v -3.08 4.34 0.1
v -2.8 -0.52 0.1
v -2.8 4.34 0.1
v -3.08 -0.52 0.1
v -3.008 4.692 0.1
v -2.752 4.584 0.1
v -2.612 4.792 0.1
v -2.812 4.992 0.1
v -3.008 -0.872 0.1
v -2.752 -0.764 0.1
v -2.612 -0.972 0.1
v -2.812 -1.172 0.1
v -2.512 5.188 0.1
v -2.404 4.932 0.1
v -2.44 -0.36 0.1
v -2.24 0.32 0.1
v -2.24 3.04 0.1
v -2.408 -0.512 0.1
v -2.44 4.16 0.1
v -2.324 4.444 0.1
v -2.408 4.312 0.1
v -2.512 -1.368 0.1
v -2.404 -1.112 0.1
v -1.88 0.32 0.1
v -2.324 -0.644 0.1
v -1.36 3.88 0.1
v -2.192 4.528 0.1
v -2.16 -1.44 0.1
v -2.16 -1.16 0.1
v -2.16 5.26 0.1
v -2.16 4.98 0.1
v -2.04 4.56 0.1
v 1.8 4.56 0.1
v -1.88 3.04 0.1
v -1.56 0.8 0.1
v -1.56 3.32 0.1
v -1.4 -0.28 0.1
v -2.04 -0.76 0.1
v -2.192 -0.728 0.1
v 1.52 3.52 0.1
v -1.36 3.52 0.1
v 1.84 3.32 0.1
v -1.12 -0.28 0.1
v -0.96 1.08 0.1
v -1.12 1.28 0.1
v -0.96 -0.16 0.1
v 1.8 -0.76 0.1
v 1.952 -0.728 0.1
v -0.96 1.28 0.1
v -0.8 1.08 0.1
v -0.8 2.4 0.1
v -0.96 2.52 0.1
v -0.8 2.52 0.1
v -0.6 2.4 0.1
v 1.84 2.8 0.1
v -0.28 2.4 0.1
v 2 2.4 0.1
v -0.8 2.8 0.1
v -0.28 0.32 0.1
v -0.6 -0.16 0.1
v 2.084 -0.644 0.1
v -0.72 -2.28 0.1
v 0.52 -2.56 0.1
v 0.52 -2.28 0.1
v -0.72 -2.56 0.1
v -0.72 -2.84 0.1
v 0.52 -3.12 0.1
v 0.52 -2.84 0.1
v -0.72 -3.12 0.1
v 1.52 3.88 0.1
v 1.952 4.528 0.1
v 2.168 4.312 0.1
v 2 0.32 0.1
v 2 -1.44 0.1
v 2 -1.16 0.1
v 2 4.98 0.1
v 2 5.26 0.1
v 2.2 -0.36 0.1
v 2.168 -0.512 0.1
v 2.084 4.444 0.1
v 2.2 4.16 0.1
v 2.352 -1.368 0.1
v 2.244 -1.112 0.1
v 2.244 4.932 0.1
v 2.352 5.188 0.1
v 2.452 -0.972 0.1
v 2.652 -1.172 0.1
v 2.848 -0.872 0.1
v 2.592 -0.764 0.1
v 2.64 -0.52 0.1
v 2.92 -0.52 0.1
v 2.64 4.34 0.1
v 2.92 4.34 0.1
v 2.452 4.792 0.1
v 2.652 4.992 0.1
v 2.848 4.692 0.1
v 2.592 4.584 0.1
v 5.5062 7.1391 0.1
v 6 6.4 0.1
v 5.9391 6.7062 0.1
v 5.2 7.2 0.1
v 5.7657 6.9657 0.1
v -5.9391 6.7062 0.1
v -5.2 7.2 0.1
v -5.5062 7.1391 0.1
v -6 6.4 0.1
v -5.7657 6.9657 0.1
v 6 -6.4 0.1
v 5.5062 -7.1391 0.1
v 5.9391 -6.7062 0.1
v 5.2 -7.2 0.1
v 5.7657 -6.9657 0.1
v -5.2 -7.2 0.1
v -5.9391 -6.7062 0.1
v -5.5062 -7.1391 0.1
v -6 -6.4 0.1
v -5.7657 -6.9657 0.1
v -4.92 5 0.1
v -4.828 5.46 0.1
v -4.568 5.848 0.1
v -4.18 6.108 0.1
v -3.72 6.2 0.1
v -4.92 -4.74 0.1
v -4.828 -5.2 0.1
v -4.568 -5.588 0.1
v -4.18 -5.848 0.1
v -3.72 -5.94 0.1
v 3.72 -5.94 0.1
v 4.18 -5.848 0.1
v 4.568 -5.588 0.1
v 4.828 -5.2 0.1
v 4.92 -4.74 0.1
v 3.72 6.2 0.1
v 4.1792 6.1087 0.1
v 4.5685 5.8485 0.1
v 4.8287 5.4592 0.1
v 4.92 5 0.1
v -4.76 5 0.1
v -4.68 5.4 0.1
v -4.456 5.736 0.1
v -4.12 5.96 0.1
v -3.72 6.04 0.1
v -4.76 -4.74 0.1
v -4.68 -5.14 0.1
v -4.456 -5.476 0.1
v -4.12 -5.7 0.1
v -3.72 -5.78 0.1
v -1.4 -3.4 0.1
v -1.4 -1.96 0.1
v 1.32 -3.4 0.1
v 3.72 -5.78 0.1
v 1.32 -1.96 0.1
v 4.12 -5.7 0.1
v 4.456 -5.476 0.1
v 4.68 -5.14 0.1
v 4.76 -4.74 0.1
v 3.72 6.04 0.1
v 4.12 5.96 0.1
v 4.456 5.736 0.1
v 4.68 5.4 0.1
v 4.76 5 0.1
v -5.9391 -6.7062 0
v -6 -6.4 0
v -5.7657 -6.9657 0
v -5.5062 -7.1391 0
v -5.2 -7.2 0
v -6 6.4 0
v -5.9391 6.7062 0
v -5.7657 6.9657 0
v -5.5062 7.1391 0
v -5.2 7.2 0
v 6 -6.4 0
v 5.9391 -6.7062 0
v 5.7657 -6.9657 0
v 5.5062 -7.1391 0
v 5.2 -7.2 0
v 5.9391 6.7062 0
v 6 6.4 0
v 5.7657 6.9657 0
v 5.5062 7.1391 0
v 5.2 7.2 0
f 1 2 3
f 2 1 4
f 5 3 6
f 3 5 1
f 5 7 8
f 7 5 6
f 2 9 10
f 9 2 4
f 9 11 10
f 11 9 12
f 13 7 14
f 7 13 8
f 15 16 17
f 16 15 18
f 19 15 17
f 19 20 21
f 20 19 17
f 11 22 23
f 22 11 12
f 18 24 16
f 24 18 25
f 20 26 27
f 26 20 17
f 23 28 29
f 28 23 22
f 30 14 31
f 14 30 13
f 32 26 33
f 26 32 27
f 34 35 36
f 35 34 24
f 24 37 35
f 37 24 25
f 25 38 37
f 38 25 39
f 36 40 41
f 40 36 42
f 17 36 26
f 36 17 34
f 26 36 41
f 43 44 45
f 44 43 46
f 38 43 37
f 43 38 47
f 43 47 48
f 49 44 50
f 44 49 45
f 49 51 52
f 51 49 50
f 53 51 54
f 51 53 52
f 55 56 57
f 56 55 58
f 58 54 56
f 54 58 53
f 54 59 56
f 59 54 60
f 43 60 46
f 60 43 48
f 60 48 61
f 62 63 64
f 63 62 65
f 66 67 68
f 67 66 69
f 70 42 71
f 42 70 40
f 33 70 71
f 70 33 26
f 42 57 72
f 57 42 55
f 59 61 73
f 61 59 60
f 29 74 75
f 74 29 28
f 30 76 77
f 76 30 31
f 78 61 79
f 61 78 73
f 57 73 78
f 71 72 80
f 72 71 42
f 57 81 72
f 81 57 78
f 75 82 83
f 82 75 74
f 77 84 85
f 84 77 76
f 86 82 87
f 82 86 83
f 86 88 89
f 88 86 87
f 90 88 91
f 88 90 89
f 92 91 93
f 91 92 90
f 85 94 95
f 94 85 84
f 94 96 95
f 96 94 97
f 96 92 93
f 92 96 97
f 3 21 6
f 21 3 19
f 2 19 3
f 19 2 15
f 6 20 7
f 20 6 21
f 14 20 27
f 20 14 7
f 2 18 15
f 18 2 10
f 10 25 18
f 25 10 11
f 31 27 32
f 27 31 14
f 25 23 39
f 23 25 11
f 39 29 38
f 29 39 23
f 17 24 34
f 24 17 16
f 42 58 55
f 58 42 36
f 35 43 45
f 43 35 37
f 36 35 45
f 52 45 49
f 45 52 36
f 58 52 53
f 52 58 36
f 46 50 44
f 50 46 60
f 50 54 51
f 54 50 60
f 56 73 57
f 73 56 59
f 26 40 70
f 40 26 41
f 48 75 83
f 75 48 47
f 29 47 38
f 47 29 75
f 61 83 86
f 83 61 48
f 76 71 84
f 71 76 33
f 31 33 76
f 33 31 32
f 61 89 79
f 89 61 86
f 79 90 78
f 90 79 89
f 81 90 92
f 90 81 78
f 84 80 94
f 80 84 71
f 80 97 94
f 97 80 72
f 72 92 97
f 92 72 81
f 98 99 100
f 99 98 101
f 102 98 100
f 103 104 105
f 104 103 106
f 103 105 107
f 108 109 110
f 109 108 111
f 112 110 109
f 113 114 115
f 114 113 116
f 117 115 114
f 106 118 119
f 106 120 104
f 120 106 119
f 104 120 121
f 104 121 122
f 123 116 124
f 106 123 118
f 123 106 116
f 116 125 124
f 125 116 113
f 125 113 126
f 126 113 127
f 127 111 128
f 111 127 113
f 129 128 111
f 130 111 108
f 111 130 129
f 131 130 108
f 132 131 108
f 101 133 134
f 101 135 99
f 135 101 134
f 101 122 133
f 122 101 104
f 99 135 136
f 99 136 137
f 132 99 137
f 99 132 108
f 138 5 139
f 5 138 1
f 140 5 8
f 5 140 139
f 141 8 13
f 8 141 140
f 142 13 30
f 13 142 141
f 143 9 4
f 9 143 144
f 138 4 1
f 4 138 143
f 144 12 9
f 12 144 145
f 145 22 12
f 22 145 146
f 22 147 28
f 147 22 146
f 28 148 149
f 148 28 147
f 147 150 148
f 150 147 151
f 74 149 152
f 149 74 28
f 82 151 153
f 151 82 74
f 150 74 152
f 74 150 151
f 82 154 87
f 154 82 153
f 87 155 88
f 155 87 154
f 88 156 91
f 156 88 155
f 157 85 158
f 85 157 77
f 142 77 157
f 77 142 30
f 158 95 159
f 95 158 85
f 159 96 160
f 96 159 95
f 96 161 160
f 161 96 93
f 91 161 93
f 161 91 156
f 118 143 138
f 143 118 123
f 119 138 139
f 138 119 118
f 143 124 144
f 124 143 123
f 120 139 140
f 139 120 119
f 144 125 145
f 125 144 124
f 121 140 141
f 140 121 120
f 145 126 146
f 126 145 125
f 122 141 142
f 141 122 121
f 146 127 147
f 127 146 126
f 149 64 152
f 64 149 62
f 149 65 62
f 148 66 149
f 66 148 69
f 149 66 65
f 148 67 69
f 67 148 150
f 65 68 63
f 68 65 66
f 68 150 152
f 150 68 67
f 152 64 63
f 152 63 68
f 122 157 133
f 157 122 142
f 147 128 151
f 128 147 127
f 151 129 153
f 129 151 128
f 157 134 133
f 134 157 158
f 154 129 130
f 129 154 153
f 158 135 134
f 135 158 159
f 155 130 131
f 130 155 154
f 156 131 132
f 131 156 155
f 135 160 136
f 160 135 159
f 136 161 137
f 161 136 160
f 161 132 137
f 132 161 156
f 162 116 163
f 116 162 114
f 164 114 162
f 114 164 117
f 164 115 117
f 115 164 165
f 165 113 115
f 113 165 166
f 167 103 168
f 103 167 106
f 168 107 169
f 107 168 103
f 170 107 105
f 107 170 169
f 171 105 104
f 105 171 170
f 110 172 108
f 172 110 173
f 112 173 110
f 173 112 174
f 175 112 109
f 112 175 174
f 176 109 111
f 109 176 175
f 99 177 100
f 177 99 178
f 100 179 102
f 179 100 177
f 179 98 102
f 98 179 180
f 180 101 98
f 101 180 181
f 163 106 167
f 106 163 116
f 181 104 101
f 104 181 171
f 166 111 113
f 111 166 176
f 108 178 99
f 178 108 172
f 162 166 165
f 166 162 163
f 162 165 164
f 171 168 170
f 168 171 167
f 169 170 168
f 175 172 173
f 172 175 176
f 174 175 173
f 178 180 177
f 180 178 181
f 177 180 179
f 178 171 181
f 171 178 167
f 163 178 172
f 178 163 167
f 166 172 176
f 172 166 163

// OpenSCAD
// file: ../p/1-4cyli.scad
use <../lib.scad>
function ldraw_lib__1_4cyli() = [
// 0 Cylinder 0.25
// 0 Name: 1-4cyli.dat
// 0 Author: James Jessiman
// 0 !LDRAW_ORG Primitive UPDATE 2012-01
// 0 !LICENSE Licensed under CC BY 2.0 and CC BY 4.0 : see CAreadme.txt
// 
// 0 BFC CERTIFY CCW
  [0,"BFC","CERTIFY"],
  [0,"BFC","CCW"],
// 
// 0 !HISTORY 2002-03-23 [sbliss] Added BFC statement.
// 0 !HISTORY 2002-04-25 [PTadmin] Official Update 2002-02
// 0 !HISTORY 2007-06-22 [PTadmin] Header formatted for Contributor Agreement
// 0 !HISTORY 2008-07-01 [PTadmin] Official Update 2008-01
// 0 !HISTORY 2012-02-16 [Philo] Changed to CCW
// 0 !HISTORY 2012-03-30 [PTadmin] Official Update 2012-01
// 
// 
// 4 16 1 1 0 0.9239 1 0.3827 0.9239 0 0.3827 1 0 0
  [4,16,1,1,0,0.9239,1,0.3827,0.9239,0,0.3827,1,0,0],
// 5 24 1 0 0 1 1 0 0.9239 0 0.3827 1 0 -1
  [5,24,1,0,0,1,1,0,0.9239,0,0.3827,1,0,-1],
// 4 16 0.9239 1 0.3827 0.7071 1 0.7071 0.7071 0 0.7071 0.9239 0 0.3827
  [4,16,0.9239,1,0.3827,0.7071,1,0.7071,0.7071,0,0.7071,0.9239,0,0.3827],
// 5 24 0.9239 0 0.3827 0.9239 1 0.3827 0.7071 0 0.7071 1 0 0
  [5,24,0.9239,0,0.3827,0.9239,1,0.3827,0.7071,0,0.7071,1,0,0],
// 4 16 0.7071 1 0.7071 0.3827 1 0.9239 0.3827 0 0.9239 0.7071 0 0.7071
  [4,16,0.7071,1,0.7071,0.3827,1,0.9239,0.3827,0,0.9239,0.7071,0,0.7071],
// 5 24 0.7071 0 0.7071 0.7071 1 0.7071 0.3827 0 0.9239 0.9239 0 0.3827
  [5,24,0.7071,0,0.7071,0.7071,1,0.7071,0.3827,0,0.9239,0.9239,0,0.3827],
// 4 16 0.3827 1 0.9239 0 1 1 0 0 1 0.3827 0 0.9239
  [4,16,0.3827,1,0.9239,0,1,1,0,0,1,0.3827,0,0.9239],
// 5 24 0.3827 0 0.9239 0.3827 1 0.9239 0 0 1 0.7071 0 0.7071
  [5,24,0.3827,0,0.9239,0.3827,1,0.9239,0,0,1,0.7071,0,0.7071],
// 5 24 0 0 1 0 1 1 0.3827 0 0.9239 -1 0 1
  [5,24,0,0,1,0,1,1,0.3827,0,0.9239,-1,0,1],
];
makepoly(ldraw_lib__1_4cyli(), line=0.2);
// file: ../p/1-4chrd.scad
use <../lib.scad>
function ldraw_lib__1_4chrd() = [
// 0 Chord 0.25
// 0 Name: 1-4chrd.dat
// 0 Author: Tony Hafner [hafhead]
// 0 !LDRAW_ORG Primitive UPDATE 2012-02
// 0 !LICENSE Licensed under CC BY 2.0 and CC BY 4.0 : see CAreadme.txt
// 
// 0 BFC CERTIFY CCW
  [0,"BFC","CERTIFY"],
  [0,"BFC","CCW"],
// 
// 0 !HISTORY 2004-04-22 [PTadmin] Official Update 2004-02
// 0 !HISTORY 2007-10-09 [PTadmin] Header formatted for Contributor Agreement
// 0 !HISTORY 2008-07-01 [PTadmin] Official Update 2008-01
// 0 !HISTORY 2012-08-02 [MMR1988] Re-creation with PrimGen2 and Rectifier
// 0 !HISTORY 2012-08-09 [PTadmin] Official Update 2012-02
// 
// 
// 4 16 0.9239 0 0.3827 0.3827 0 0.9239 0 0 1 1 0 0
  [4,16,0.9239,0,0.3827,0.3827,0,0.9239,0,0,1,1,0,0],
// 3 16 0.7071 0 0.7071 0.3827 0 0.9239 0.9239 0 0.3827
  [3,16,0.7071,0,0.7071,0.3827,0,0.9239,0.9239,0,0.3827],
];
makepoly(ldraw_lib__1_4chrd(), line=0.2);
// main file
use <../lib.scad>
use <../p/1-4chrd.scad>
use <../p/1-4cyli.scad>
function ldraw_lib__6138629f() = [
// 0 Sticker  1.5 x  1.8 Red with Containment Unit
// 0 Name: 6138629f.dat
// 0 Author: Joel Barker [joel333]
// 0 !LDRAW_ORG Part UPDATE 2022-01
// 0 !LICENSE Licensed under CC BY 2.0 and CC BY 4.0 : see CAreadme.txt
// 
// 0 BFC CERTIFY CCW
  [0,"BFC","CERTIFY"],
  [0,"BFC","CCW"],
// 
// 0 !KEYWORDS firehouse, Ghostbusters, set 75827
// 
// 0 !HISTORY 2022-01-14 [PTadmin] Official Update 2022-01
// 
// 
// 0 // black background
// 4 0 -7.7 -0.25 10.85 -7.7 -0.25 -1.3 -7 -0.25 -1.3 -7 -0.25 10.85
  [4,0,-7.7,-0.25,10.85,-7.7,-0.25,-1.3,-7,-0.25,-1.3,-7,-0.25,10.85],
// 4 0 -7.52 -0.25 11.73 -7.7 -0.25 10.85 -7 -0.25 10.85 -6.88 -0.25 11.46
  [4,0,-7.52,-0.25,11.73,-7.7,-0.25,10.85,-7,-0.25,10.85,-6.88,-0.25,11.46],
// 4 0 -7.03 -0.25 12.48 -7.52 -0.25 11.73 -6.88 -0.25 11.46 -6.53 -0.25 11.98
  [4,0,-7.03,-0.25,12.48,-7.52,-0.25,11.73,-6.88,-0.25,11.46,-6.53,-0.25,11.98],
// 4 0 -6.88 -0.25 -1.91 -7 -0.25 -1.3 -7.7 -0.25 -1.3 -7.52 -0.25 -2.18
  [4,0,-6.88,-0.25,-1.91,-7,-0.25,-1.3,-7.7,-0.25,-1.3,-7.52,-0.25,-2.18],
// 4 0 -6.53 -0.25 -2.43 -6.88 -0.25 -1.91 -7.52 -0.25 -2.18 -7.03 -0.25 -2.93
  [4,0,-6.53,-0.25,-2.43,-6.88,-0.25,-1.91,-7.52,-0.25,-2.18,-7.03,-0.25,-2.93],
// 4 0 -6.28 -0.25 12.97 -7.03 -0.25 12.48 -6.53 -0.25 11.98 -6.01 -0.25 12.33
  [4,0,-6.28,-0.25,12.97,-7.03,-0.25,12.48,-6.53,-0.25,11.98,-6.01,-0.25,12.33],
// 4 0 -6.1 -0.25 -0.9 -6.02 -0.25 -1.28 -5.6 -0.25 0.8 -5.6 -0.25 7.6
  [4,0,-6.1,-0.25,-0.9,-6.02,-0.25,-1.28,-5.6,-0.25,0.8,-5.6,-0.25,7.6],
// 3 0 -6.1 -0.25 10.4 -6.1 -0.25 -0.9 -5.6 -0.25 7.6
  [3,0,-6.1,-0.25,10.4,-6.1,-0.25,-0.9,-5.6,-0.25,7.6],
// 4 0 -6.02 -0.25 10.78 -6.1 -0.25 10.4 -5.6 -0.25 7.6 -5.81 -0.25 11.11
  [4,0,-6.02,-0.25,10.78,-6.1,-0.25,10.4,-5.6,-0.25,7.6,-5.81,-0.25,11.11],
// 4 0 -6.01 -0.25 -2.78 -6.53 -0.25 -2.43 -7.03 -0.25 -2.93 -6.28 -0.25 -3.42
  [4,0,-6.01,-0.25,-2.78,-6.53,-0.25,-2.43,-7.03,-0.25,-2.93,-6.28,-0.25,-3.42],
// 4 0 -5.81 -0.25 -1.61 -4.7 -0.25 0.8 -5.6 -0.25 0.8 -6.02 -0.25 -1.28
  [4,0,-5.81,-0.25,-1.61,-4.7,-0.25,0.8,-5.6,-0.25,0.8,-6.02,-0.25,-1.28],
// 4 0 -5.81 -0.25 11.11 -5.6 -0.25 7.6 -3.4 -0.25 9.7 -5.48 -0.25 11.32
  [4,0,-5.81,-0.25,11.11,-5.6,-0.25,7.6,-3.4,-0.25,9.7,-5.48,-0.25,11.32],
// 4 0 -5.4 -0.25 -2.9 -6.01 -0.25 -2.78 -6.28 -0.25 -3.42 -5.4 -0.25 -3.6
  [4,0,-5.4,-0.25,-2.9,-6.01,-0.25,-2.78,-6.28,-0.25,-3.42,-5.4,-0.25,-3.6],
// 4 0 -5.4 -0.25 13.15 -6.28 -0.25 12.97 -6.01 -0.25 12.33 -5.4 -0.25 12.45
  [4,0,-5.4,-0.25,13.15,-6.28,-0.25,12.97,-6.01,-0.25,12.33,-5.4,-0.25,12.45],
// 4 0 -5.1 -0.25 11.4 -5.48 -0.25 11.32 -3.4 -0.25 9.7 4.5 -0.25 11.4
  [4,0,-5.1,-0.25,11.4,-5.48,-0.25,11.32,-3.4,-0.25,9.7,4.5,-0.25,11.4],
// 4 0 -4.7 -0.25 7.6 -4.7 -0.25 0.8 -3.9 -0.25 2 -3.9 -0.25 8.3
  [4,0,-4.7,-0.25,7.6,-4.7,-0.25,0.8,-3.9,-0.25,2,-3.9,-0.25,8.3],
// 4 0 -3.5 -0.25 -0.7 -3.9 -0.25 2 -4.7 -0.25 0.8 -5.81 -0.25 -1.61
  [4,0,-3.5,-0.25,-0.7,-3.9,-0.25,2,-4.7,-0.25,0.8,-5.81,-0.25,-1.61],
// 4 0 -3.5 -0.25 -0.7 -5.81 -0.25 -1.61 -5.48 -0.25 -1.82 -5.1 -0.25 -1.9
  [4,0,-3.5,-0.25,-0.7,-5.81,-0.25,-1.61,-5.48,-0.25,-1.82,-5.1,-0.25,-1.9],
// 4 0 -3.4 -0.25 8.8 -3.9 -0.25 8.3 4.6 -0.25 8.3 3.8 -0.25 8.8
  [4,0,-3.4,-0.25,8.8,-3.9,-0.25,8.3,4.6,-0.25,8.3,3.8,-0.25,8.8],
// 4 0 -3.4 -0.25 9.7 -5.6 -0.25 7.6 -4.7 -0.25 7.6 -3.9 -0.25 8.3
  [4,0,-3.4,-0.25,9.7,-5.6,-0.25,7.6,-4.7,-0.25,7.6,-3.9,-0.25,8.3],
// 3 0 -3.4 -0.25 9.7 -3.9 -0.25 8.3 -3.4 -0.25 8.8
  [3,0,-3.4,-0.25,9.7,-3.9,-0.25,8.3,-3.4,-0.25,8.8],
// 4 0 -2.8 -0.25 3.2 -2.8 -0.25 -0.7 -2.4 -0.25 -0.4 -2.4 -0.25 2.7
  [4,0,-2.8,-0.25,3.2,-2.8,-0.25,-0.7,-2.4,-0.25,-0.4,-2.4,-0.25,2.7],
// 4 0 -2.8 -0.25 -0.7 -3.5 -0.25 -0.7 -5.1 -0.25 -1.9 4.5 -0.25 -1.9
  [4,0,-2.8,-0.25,-0.7,-3.5,-0.25,-0.7,-5.1,-0.25,-1.9,4.5,-0.25,-1.9],
// 3 0 -2.8 -0.25 -0.7 4.5 -0.25 -1.9 4.88 -0.25 -1.82
  [3,0,-2.8,-0.25,-0.7,4.5,-0.25,-1.9,4.88,-0.25,-1.82],
// 4 0 -2.4 -0.25 3.2 -2.8 -0.25 3.2 -2.4 -0.25 2.7 -2 -0.25 2.7
  [4,0,-2.4,-0.25,3.2,-2.8,-0.25,3.2,-2.4,-0.25,2.7,-2,-0.25,2.7],
// 4 0 -2.4 -0.25 6.3 -2.4 -0.25 3.2 -2 -0.25 2.7 -2 -0.25 6
  [4,0,-2.4,-0.25,6.3,-2.4,-0.25,3.2,-2,-0.25,2.7,-2,-0.25,6],
// 4 0 -2.4 -0.25 6.3 -2 -0.25 6 -1.5 -0.25 6 -2 -0.25 6.3
  [4,0,-2.4,-0.25,6.3,-2,-0.25,6,-1.5,-0.25,6,-2,-0.25,6.3],
// 4 0 -2 -0.25 7 -0.7 -0.25 6 5 -0.25 6 4.6 -0.25 7
  [4,0,-2,-0.25,7,-0.7,-0.25,6,5,-0.25,6,4.6,-0.25,7],
// 4 0 -2 -0.25 7 -2 -0.25 6.3 -1.5 -0.25 6 -0.7 -0.25 6
  [4,0,-2,-0.25,7,-2,-0.25,6.3,-1.5,-0.25,6,-0.7,-0.25,6],
// 4 0 -1.5 -0.25 6 -1.5 -0.25 -0.4 -0.7 -0.25 0.8 -0.7 -0.25 6
  [4,0,-1.5,-0.25,6,-1.5,-0.25,-0.4,-0.7,-0.25,0.8,-0.7,-0.25,6],
// 4 0 -1.5 -0.25 -0.4 -2.4 -0.25 -0.4 -2.8 -0.25 -0.7 4.88 -0.25 -1.82
  [4,0,-1.5,-0.25,-0.4,-2.4,-0.25,-0.4,-2.8,-0.25,-0.7,4.88,-0.25,-1.82],
// 3 0 -1.5 -0.25 -0.4 4.88 -0.25 -1.82 5.21 -0.25 -1.61
  [3,0,-1.5,-0.25,-0.4,4.88,-0.25,-1.82,5.21,-0.25,-1.61],
// 4 0 1.3 -0.25 -5.7 -1.8 -0.25 -5.7 -1.8 -0.25 -6.4 1.3 -0.25 -6.4
  [4,0,1.3,-0.25,-5.7,-1.8,-0.25,-5.7,-1.8,-0.25,-6.4,1.3,-0.25,-6.4],
// 4 0 1.3 -0.25 -7.1 -1.8 -0.25 -7.1 -1.8 -0.25 -7.8 1.3 -0.25 -7.8
  [4,0,1.3,-0.25,-7.1,-1.8,-0.25,-7.1,-1.8,-0.25,-7.8,1.3,-0.25,-7.8],
// 4 0 3.8 -0.25 9.7 3.8 -0.25 8.8 4.6 -0.25 8.3 4.88 -0.25 11.32
  [4,0,3.8,-0.25,9.7,3.8,-0.25,8.8,4.6,-0.25,8.3,4.88,-0.25,11.32],
// 4 0 3.8 -0.25 9.7 4.88 -0.25 11.32 4.5 -0.25 11.4 -3.4 -0.25 9.7
  [4,0,3.8,-0.25,9.7,4.88,-0.25,11.32,4.5,-0.25,11.4,-3.4,-0.25,9.7],
// 4 0 4.6 -0.25 8.3 4.6 -0.25 7 5 -0.25 6 5.42 -0.25 10.78
  [4,0,4.6,-0.25,8.3,4.6,-0.25,7,5,-0.25,6,5.42,-0.25,10.78],
// 4 0 5 -0.25 0.8 -0.7 -0.25 0.8 -1.5 -0.25 -0.4 5.21 -0.25 -1.61
  [4,0,5,-0.25,0.8,-0.7,-0.25,0.8,-1.5,-0.25,-0.4,5.21,-0.25,-1.61],
// 4 0 5 -0.25 -2.9 -5.4 -0.25 -2.9 -5.4 -0.25 -3.6 5 -0.25 -3.6
  [4,0,5,-0.25,-2.9,-5.4,-0.25,-2.9,-5.4,-0.25,-3.6,5,-0.25,-3.6],
// 4 0 5 -0.25 13.15 -5.4 -0.25 13.15 -5.4 -0.25 12.45 5 -0.25 12.45
  [4,0,5,-0.25,13.15,-5.4,-0.25,13.15,-5.4,-0.25,12.45,5,-0.25,12.45],
// 4 0 5 -0.25 0.8 5.21 -0.25 -1.61 5.42 -0.25 -1.28 5.5 -0.25 -0.9
  [4,0,5,-0.25,0.8,5.21,-0.25,-1.61,5.42,-0.25,-1.28,5.5,-0.25,-0.9],
// 3 0 5 -0.25 6 5 -0.25 0.8 5.5 -0.25 -0.9
  [3,0,5,-0.25,6,5,-0.25,0.8,5.5,-0.25,-0.9],
// 4 0 5.21 -0.25 11.11 4.88 -0.25 11.32 4.6 -0.25 8.3 5.42 -0.25 10.78
  [4,0,5.21,-0.25,11.11,4.88,-0.25,11.32,4.6,-0.25,8.3,5.42,-0.25,10.78],
// 4 0 5.5 -0.25 10.4 5.42 -0.25 10.78 5 -0.25 6 5.5 -0.25 -0.9
  [4,0,5.5,-0.25,10.4,5.42,-0.25,10.78,5,-0.25,6,5.5,-0.25,-0.9],
// 4 0 5.61 -0.25 -2.78 5 -0.25 -2.9 5 -0.25 -3.6 5.88 -0.25 -3.42
  [4,0,5.61,-0.25,-2.78,5,-0.25,-2.9,5,-0.25,-3.6,5.88,-0.25,-3.42],
// 4 0 5.88 -0.25 12.97 5 -0.25 13.15 5 -0.25 12.45 5.61 -0.25 12.33
  [4,0,5.88,-0.25,12.97,5,-0.25,13.15,5,-0.25,12.45,5.61,-0.25,12.33],
// 4 0 6.13 -0.25 -2.43 5.61 -0.25 -2.78 5.88 -0.25 -3.42 6.63 -0.25 -2.93
  [4,0,6.13,-0.25,-2.43,5.61,-0.25,-2.78,5.88,-0.25,-3.42,6.63,-0.25,-2.93],
// 4 0 6.48 -0.25 -1.91 6.13 -0.25 -2.43 6.63 -0.25 -2.93 7.12 -0.25 -2.18
  [4,0,6.48,-0.25,-1.91,6.13,-0.25,-2.43,6.63,-0.25,-2.93,7.12,-0.25,-2.18],
// 4 0 6.6 -0.25 -1.3 6.48 -0.25 -1.91 7.12 -0.25 -2.18 7.3 -0.25 -1.3
  [4,0,6.6,-0.25,-1.3,6.48,-0.25,-1.91,7.12,-0.25,-2.18,7.3,-0.25,-1.3],
// 4 0 6.6 -0.25 10.85 6.6 -0.25 -1.3 7.3 -0.25 -1.3 7.3 -0.25 10.85
  [4,0,6.6,-0.25,10.85,6.6,-0.25,-1.3,7.3,-0.25,-1.3,7.3,-0.25,10.85],
// 4 0 6.63 -0.25 12.48 5.88 -0.25 12.97 5.61 -0.25 12.33 6.13 -0.25 11.98
  [4,0,6.63,-0.25,12.48,5.88,-0.25,12.97,5.61,-0.25,12.33,6.13,-0.25,11.98],
// 4 0 7.12 -0.25 11.73 6.63 -0.25 12.48 6.13 -0.25 11.98 6.48 -0.25 11.46
  [4,0,7.12,-0.25,11.73,6.63,-0.25,12.48,6.13,-0.25,11.98,6.48,-0.25,11.46],
// 4 0 7.3 -0.25 10.85 7.12 -0.25 11.73 6.48 -0.25 11.46 6.6 -0.25 10.85
  [4,0,7.3,-0.25,10.85,7.12,-0.25,11.73,6.48,-0.25,11.46,6.6,-0.25,10.85],
// 0 // inner red area
// 4 4 -7 -0.25 10.85 -6.1 -0.25 10.4 -6.02 -0.25 10.78 -6.88 -0.25 11.46
  [4,4,-7,-0.25,10.85,-6.1,-0.25,10.4,-6.02,-0.25,10.78,-6.88,-0.25,11.46],
// 4 4 -7 -0.25 10.85 -7 -0.25 -1.3 -6.1 -0.25 -0.9 -6.1 -0.25 10.4
  [4,4,-7,-0.25,10.85,-7,-0.25,-1.3,-6.1,-0.25,-0.9,-6.1,-0.25,10.4],
// 4 4 -6.88 -0.25 11.46 -6.02 -0.25 10.78 -5.81 -0.25 11.11 -6.53 -0.25 11.98
  [4,4,-6.88,-0.25,11.46,-6.02,-0.25,10.78,-5.81,-0.25,11.11,-6.53,-0.25,11.98],
// 4 4 -6.53 -0.25 11.98 -5.81 -0.25 11.11 -5.48 -0.25 11.32 -6.01 -0.25 12.33
  [4,4,-6.53,-0.25,11.98,-5.81,-0.25,11.11,-5.48,-0.25,11.32,-6.01,-0.25,12.33],
// 4 4 -6.1 -0.25 -0.9 -7 -0.25 -1.3 -6.88 -0.25 -1.91 -6.02 -0.25 -1.28
  [4,4,-6.1,-0.25,-0.9,-7,-0.25,-1.3,-6.88,-0.25,-1.91,-6.02,-0.25,-1.28],
// 4 4 -6.02 -0.25 -1.28 -6.88 -0.25 -1.91 -6.53 -0.25 -2.43 -5.81 -0.25 -1.61
  [4,4,-6.02,-0.25,-1.28,-6.88,-0.25,-1.91,-6.53,-0.25,-2.43,-5.81,-0.25,-1.61],
// 4 4 -6.01 -0.25 12.33 -5.48 -0.25 11.32 -5.1 -0.25 11.4 -5.4 -0.25 12.45
  [4,4,-6.01,-0.25,12.33,-5.48,-0.25,11.32,-5.1,-0.25,11.4,-5.4,-0.25,12.45],
// 4 4 -5.81 -0.25 -1.61 -6.53 -0.25 -2.43 -6.01 -0.25 -2.78 -5.48 -0.25 -1.82
  [4,4,-5.81,-0.25,-1.61,-6.53,-0.25,-2.43,-6.01,-0.25,-2.78,-5.48,-0.25,-1.82],
// 4 4 -5.48 -0.25 -1.82 -6.01 -0.25 -2.78 -5.4 -0.25 -2.9 -5.1 -0.25 -1.9
  [4,4,-5.48,-0.25,-1.82,-6.01,-0.25,-2.78,-5.4,-0.25,-2.9,-5.1,-0.25,-1.9],
// 4 4 -4.7 -0.25 7.6 -5.6 -0.25 7.6 -5.6 -0.25 0.8 -4.7 -0.25 0.8
  [4,4,-4.7,-0.25,7.6,-5.6,-0.25,7.6,-5.6,-0.25,0.8,-4.7,-0.25,0.8],
// 4 4 -3.9 -0.25 8.3 -2 -0.25 7 4.6 -0.25 7 4.6 -0.25 8.3
  [4,4,-3.9,-0.25,8.3,-2,-0.25,7,4.6,-0.25,7,4.6,-0.25,8.3],
// 4 4 -3.9 -0.25 2 -3.5 -0.25 -0.7 -2.8 -0.25 -0.7 -2.8 -0.25 3.2
  [4,4,-3.9,-0.25,2,-3.5,-0.25,-0.7,-2.8,-0.25,-0.7,-2.8,-0.25,3.2],
// 3 4 -3.9 -0.25 8.3 -3.9 -0.25 2 -2.8 -0.25 3.2
  [3,4,-3.9,-0.25,8.3,-3.9,-0.25,2,-2.8,-0.25,3.2],
// 4 4 -2.8 -0.25 3.2 -2.4 -0.25 3.2 -2.4 -0.25 6.3 -3.9 -0.25 8.3
  [4,4,-2.8,-0.25,3.2,-2.4,-0.25,3.2,-2.4,-0.25,6.3,-3.9,-0.25,8.3],
// 4 4 -2.4 -0.25 6.3 -2 -0.25 6.3 -2 -0.25 7 -3.9 -0.25 8.3
  [4,4,-2.4,-0.25,6.3,-2,-0.25,6.3,-2,-0.25,7,-3.9,-0.25,8.3],
// 4 4 -2 -0.25 2.7 -2.4 -0.25 2.7 -2.4 -0.25 -0.4 -1.5 -0.25 -0.4
  [4,4,-2,-0.25,2.7,-2.4,-0.25,2.7,-2.4,-0.25,-0.4,-1.5,-0.25,-0.4],
// 4 4 -2 -0.25 2.7 -1.5 -0.25 -0.4 -1.5 -0.25 6 -2 -0.25 6
  [4,4,-2,-0.25,2.7,-1.5,-0.25,-0.4,-1.5,-0.25,6,-2,-0.25,6],
// 4 4 -0.7 -0.25 6 -0.7 -0.25 0.8 5 -0.25 0.8 5 -0.25 6
  [4,4,-0.7,-0.25,6,-0.7,-0.25,0.8,5,-0.25,0.8,5,-0.25,6],
// 4 4 3.8 -0.25 9.7 -3.4 -0.25 9.7 -3.4 -0.25 8.8 3.8 -0.25 8.8
  [4,4,3.8,-0.25,9.7,-3.4,-0.25,9.7,-3.4,-0.25,8.8,3.8,-0.25,8.8],
// 4 4 4.5 -0.25 -1.9 5 -0.25 -2.9 5.61 -0.25 -2.78 4.88 -0.25 -1.82
  [4,4,4.5,-0.25,-1.9,5,-0.25,-2.9,5.61,-0.25,-2.78,4.88,-0.25,-1.82],
// 4 4 4.5 -0.25 -1.9 -5.1 -0.25 -1.9 -5.4 -0.25 -2.9 5 -0.25 -2.9
  [4,4,4.5,-0.25,-1.9,-5.1,-0.25,-1.9,-5.4,-0.25,-2.9,5,-0.25,-2.9],
// 4 4 4.88 -0.25 -1.82 5.61 -0.25 -2.78 6.13 -0.25 -2.43 5.21 -0.25 -1.61
  [4,4,4.88,-0.25,-1.82,5.61,-0.25,-2.78,6.13,-0.25,-2.43,5.21,-0.25,-1.61],
// 4 4 5 -0.25 12.45 4.5 -0.25 11.4 4.88 -0.25 11.32 5.61 -0.25 12.33
  [4,4,5,-0.25,12.45,4.5,-0.25,11.4,4.88,-0.25,11.32,5.61,-0.25,12.33],
// 4 4 5 -0.25 12.45 -5.4 -0.25 12.45 -5.1 -0.25 11.4 4.5 -0.25 11.4
  [4,4,5,-0.25,12.45,-5.4,-0.25,12.45,-5.1,-0.25,11.4,4.5,-0.25,11.4],
// 4 4 5.21 -0.25 -1.61 6.13 -0.25 -2.43 6.48 -0.25 -1.91 5.42 -0.25 -1.28
  [4,4,5.21,-0.25,-1.61,6.13,-0.25,-2.43,6.48,-0.25,-1.91,5.42,-0.25,-1.28],
// 4 4 5.42 -0.25 -1.28 6.48 -0.25 -1.91 6.6 -0.25 -1.3 5.5 -0.25 -0.9
  [4,4,5.42,-0.25,-1.28,6.48,-0.25,-1.91,6.6,-0.25,-1.3,5.5,-0.25,-0.9],
// 4 4 5.5 -0.25 10.4 5.5 -0.25 -0.9 6.6 -0.25 -1.3 6.6 -0.25 10.85
  [4,4,5.5,-0.25,10.4,5.5,-0.25,-0.9,6.6,-0.25,-1.3,6.6,-0.25,10.85],
// 4 4 5.61 -0.25 12.33 4.88 -0.25 11.32 5.21 -0.25 11.11 6.13 -0.25 11.98
  [4,4,5.61,-0.25,12.33,4.88,-0.25,11.32,5.21,-0.25,11.11,6.13,-0.25,11.98],
// 4 4 6.13 -0.25 11.98 5.21 -0.25 11.11 5.42 -0.25 10.78 6.48 -0.25 11.46
  [4,4,6.13,-0.25,11.98,5.21,-0.25,11.11,5.42,-0.25,10.78,6.48,-0.25,11.46],
// 4 4 6.48 -0.25 11.46 5.42 -0.25 10.78 5.5 -0.25 10.4 6.6 -0.25 10.85
  [4,4,6.48,-0.25,11.46,5.42,-0.25,10.78,5.5,-0.25,10.4,6.6,-0.25,10.85],
// 0 // outer red area
// 1 4 13 -0.25 16 2 0 0 0 1 0 0 0 2 1-4chrd.dat
  [1,4,13,-0.25,16,2,0,0,0,1,0,0,0,2, ldraw_lib__1_4chrd()],
// 1 4 -13 -0.25 16 -2 0 0 0 1 0 0 0 2 1-4chrd.dat
  [1,4,-13,-0.25,16,-2,0,0,0,1,0,0,0,2, ldraw_lib__1_4chrd()],
// 1 4 13 -0.25 -16 0 0 2 0 1 0 -2 0 0 1-4chrd.dat
  [1,4,13,-0.25,-16,0,0,2,0,1,0,-2,0,0, ldraw_lib__1_4chrd()],
// 1 4 -13 -0.25 -16 -2 0 0 0 1 0 0 0 -2 1-4chrd.dat
  [1,4,-13,-0.25,-16,-2,0,0,0,1,0,0,0,-2, ldraw_lib__1_4chrd()],
// 3 4 -15 -0.25 16 -12.3 -0.25 12.5 -12.07 -0.25 13.65
  [3,4,-15,-0.25,16,-12.3,-0.25,12.5,-12.07,-0.25,13.65],
// 4 4 -15 -0.25 16 -12.07 -0.25 13.65 -11.42 -0.25 14.62 -13 -0.25 18
  [4,4,-15,-0.25,16,-12.07,-0.25,13.65,-11.42,-0.25,14.62,-13,-0.25,18],
// 3 4 -13 -0.25 18 -11.42 -0.25 14.62 -10.45 -0.25 15.27
  [3,4,-13,-0.25,18,-11.42,-0.25,14.62,-10.45,-0.25,15.27],
// 3 4 -13 -0.25 18 -10.45 -0.25 15.27 -9.3 -0.25 15.5
  [3,4,-13,-0.25,18,-10.45,-0.25,15.27,-9.3,-0.25,15.5],
// 3 4 -12.3 -0.25 -11.85 -15 -0.25 -16 -12.07 -0.25 -13
  [3,4,-12.3,-0.25,-11.85,-15,-0.25,-16,-12.07,-0.25,-13],
// 4 4 -12.3 -0.25 12.5 -15 -0.25 16 -15 -0.25 -16 -12.3 -0.25 -11.85
  [4,4,-12.3,-0.25,12.5,-15,-0.25,16,-15,-0.25,-16,-12.3,-0.25,-11.85],
// 4 4 -11.42 -0.25 -13.97 -12.07 -0.25 -13 -15 -0.25 -16 -13 -0.25 -18
  [4,4,-11.42,-0.25,-13.97,-12.07,-0.25,-13,-15,-0.25,-16,-13,-0.25,-18],
// 3 4 -11.42 -0.25 -13.97 -13 -0.25 -18 -10.45 -0.25 -14.62
  [3,4,-11.42,-0.25,-13.97,-13,-0.25,-18,-10.45,-0.25,-14.62],
// 3 4 -10.45 -0.25 -14.62 -13 -0.25 -18 -9.3 -0.25 -14.85
  [3,4,-10.45,-0.25,-14.62,-13,-0.25,-18,-9.3,-0.25,-14.85],
// 4 4 9.3 -0.25 -14.85 -9.3 -0.25 -14.85 -13 -0.25 -18 13 -0.25 -18
  [4,4,9.3,-0.25,-14.85,-9.3,-0.25,-14.85,-13,-0.25,-18,13,-0.25,-18],
// 3 4 10.45 -0.25 -14.62 9.3 -0.25 -14.85 13 -0.25 -18
  [3,4,10.45,-0.25,-14.62,9.3,-0.25,-14.85,13,-0.25,-18],
// 4 4 11.42 -0.25 -13.97 10.45 -0.25 -14.62 13 -0.25 -18 15 -0.25 -16
  [4,4,11.42,-0.25,-13.97,10.45,-0.25,-14.62,13,-0.25,-18,15,-0.25,-16],
// 3 4 12.07 -0.25 -13 11.42 -0.25 -13.97 15 -0.25 -16
  [3,4,12.07,-0.25,-13,11.42,-0.25,-13.97,15,-0.25,-16],
// 3 4 12.3 -0.25 -11.85 12.07 -0.25 -13 15 -0.25 -16
  [3,4,12.3,-0.25,-11.85,12.07,-0.25,-13,15,-0.25,-16],
// 3 4 13 -0.25 18 9.3 -0.25 15.5 10.4481 -0.25 15.2717
  [3,4,13,-0.25,18,9.3,-0.25,15.5,10.4481,-0.25,15.2717],
// 4 4 13 -0.25 18 10.4481 -0.25 15.2717 11.4213 -0.25 14.6213 15 -0.25 16
  [4,4,13,-0.25,18,10.4481,-0.25,15.2717,11.4213,-0.25,14.6213,15,-0.25,16],
// 4 4 13 -0.25 18 -13 -0.25 18 -9.3 -0.25 15.5 9.3 -0.25 15.5
  [4,4,13,-0.25,18,-13,-0.25,18,-9.3,-0.25,15.5,9.3,-0.25,15.5],
// 3 4 15 -0.25 16 11.4213 -0.25 14.6213 12.0717 -0.25 13.6481
  [3,4,15,-0.25,16,11.4213,-0.25,14.6213,12.0717,-0.25,13.6481],
// 3 4 15 -0.25 16 12.0717 -0.25 13.6481 12.3 -0.25 12.5
  [3,4,15,-0.25,16,12.0717,-0.25,13.6481,12.3,-0.25,12.5],
// 4 4 15 -0.25 16 12.3 -0.25 12.5 12.3 -0.25 -11.85 15 -0.25 -16
  [4,4,15,-0.25,16,12.3,-0.25,12.5,12.3,-0.25,-11.85,15,-0.25,-16],
// 0 // middle red area
// 4 4 -11.9 -0.25 12.5 -7.7 -0.25 10.85 -7.52 -0.25 11.73 -11.7 -0.25 13.5
  [4,4,-11.9,-0.25,12.5,-7.7,-0.25,10.85,-7.52,-0.25,11.73,-11.7,-0.25,13.5],
// 4 4 -11.7 -0.25 13.5 -7.52 -0.25 11.73 -7.03 -0.25 12.48 -11.14 -0.25 14.34
  [4,4,-11.7,-0.25,13.5,-7.52,-0.25,11.73,-7.03,-0.25,12.48,-11.14,-0.25,14.34],
// 4 4 -11.14 -0.25 14.34 -7.03 -0.25 12.48 -6.28 -0.25 12.97 -10.3 -0.25 14.9
  [4,4,-11.14,-0.25,14.34,-7.03,-0.25,12.48,-6.28,-0.25,12.97,-10.3,-0.25,14.9],
// 4 4 -10.3 -0.25 14.9 -6.28 -0.25 12.97 -5.4 -0.25 13.15 -9.3 -0.25 15.1
  [4,4,-10.3,-0.25,14.9,-6.28,-0.25,12.97,-5.4,-0.25,13.15,-9.3,-0.25,15.1],
// 4 4 -7.7 -0.25 -1.3 -11.9 -0.25 -11.85 -11.7 -0.25 -12.85 -7.52 -0.25 -2.18
  [4,4,-7.7,-0.25,-1.3,-11.9,-0.25,-11.85,-11.7,-0.25,-12.85,-7.52,-0.25,-2.18],
// 4 4 -7.7 -0.25 10.85 -11.9 -0.25 12.5 -11.9 -0.25 -11.85 -7.7 -0.25 -1.3
  [4,4,-7.7,-0.25,10.85,-11.9,-0.25,12.5,-11.9,-0.25,-11.85,-7.7,-0.25,-1.3],
// 4 4 -7.52 -0.25 -2.18 -11.7 -0.25 -12.85 -11.14 -0.25 -13.69 -7.03 -0.25 -2.93
  [4,4,-7.52,-0.25,-2.18,-11.7,-0.25,-12.85,-11.14,-0.25,-13.69,-7.03,-0.25,-2.93],
// 4 4 -7.03 -0.25 -2.93 -11.14 -0.25 -13.69 -10.3 -0.25 -14.25 -6.28 -0.25 -3.42
  [4,4,-7.03,-0.25,-2.93,-11.14,-0.25,-13.69,-10.3,-0.25,-14.25,-6.28,-0.25,-3.42],
// 4 4 -6.28 -0.25 -3.42 -10.3 -0.25 -14.25 -9.3 -0.25 -14.45 -5.4 -0.25 -3.6
  [4,4,-6.28,-0.25,-3.42,-10.3,-0.25,-14.25,-9.3,-0.25,-14.45,-5.4,-0.25,-3.6],
// 4 4 -3.5 -0.25 -8.5 -3.5 -0.25 -4.9 -5.4 -0.25 -3.6 -9.3 -0.25 -14.45
  [4,4,-3.5,-0.25,-8.5,-3.5,-0.25,-4.9,-5.4,-0.25,-3.6,-9.3,-0.25,-14.45],
// 4 4 3.3 -0.25 -8.5 -3.5 -0.25 -8.5 -9.3 -0.25 -14.45 9.3 -0.25 -14.45
  [4,4,3.3,-0.25,-8.5,-3.5,-0.25,-8.5,-9.3,-0.25,-14.45,9.3,-0.25,-14.45],
// 4 4 5 -0.25 -3.6 -5.4 -0.25 -3.6 -3.5 -0.25 -4.9 3.3 -0.25 -4.9
  [4,4,5,-0.25,-3.6,-5.4,-0.25,-3.6,-3.5,-0.25,-4.9,3.3,-0.25,-4.9],
// 4 4 5 -0.25 -3.6 9.3 -0.25 -14.45 10.3 -0.25 -14.25 5.88 -0.25 -3.42
  [4,4,5,-0.25,-3.6,9.3,-0.25,-14.45,10.3,-0.25,-14.25,5.88,-0.25,-3.42],
// 4 4 5 -0.25 -3.6 3.3 -0.25 -4.9 3.3 -0.25 -8.5 9.3 -0.25 -14.45
  [4,4,5,-0.25,-3.6,3.3,-0.25,-4.9,3.3,-0.25,-8.5,9.3,-0.25,-14.45],
// 4 4 5.88 -0.25 -3.42 10.3 -0.25 -14.25 11.14 -0.25 -13.69 6.63 -0.25 -2.93
  [4,4,5.88,-0.25,-3.42,10.3,-0.25,-14.25,11.14,-0.25,-13.69,6.63,-0.25,-2.93],
// 4 4 6.63 -0.25 -2.93 11.14 -0.25 -13.69 11.7 -0.25 -12.85 7.12 -0.25 -2.18
  [4,4,6.63,-0.25,-2.93,11.14,-0.25,-13.69,11.7,-0.25,-12.85,7.12,-0.25,-2.18],
// 4 4 7.12 -0.25 -2.18 11.7 -0.25 -12.85 11.9 -0.25 -11.85 7.3 -0.25 -1.3
  [4,4,7.12,-0.25,-2.18,11.7,-0.25,-12.85,11.9,-0.25,-11.85,7.3,-0.25,-1.3],
// 4 4 9.3 -0.25 15.1 5 -0.25 13.15 5.88 -0.25 12.97 10.3 -0.25 14.9
  [4,4,9.3,-0.25,15.1,5,-0.25,13.15,5.88,-0.25,12.97,10.3,-0.25,14.9],
// 4 4 9.3 -0.25 15.1 -9.3 -0.25 15.1 -5.4 -0.25 13.15 5 -0.25 13.15
  [4,4,9.3,-0.25,15.1,-9.3,-0.25,15.1,-5.4,-0.25,13.15,5,-0.25,13.15],
// 4 4 10.3 -0.25 14.9 5.88 -0.25 12.97 6.63 -0.25 12.48 11.14 -0.25 14.34
  [4,4,10.3,-0.25,14.9,5.88,-0.25,12.97,6.63,-0.25,12.48,11.14,-0.25,14.34],
// 4 4 11.14 -0.25 14.34 6.63 -0.25 12.48 7.12 -0.25 11.73 11.7 -0.25 13.5
  [4,4,11.14,-0.25,14.34,6.63,-0.25,12.48,7.12,-0.25,11.73,11.7,-0.25,13.5],
// 4 4 11.7 -0.25 13.5 7.12 -0.25 11.73 7.3 -0.25 10.85 11.9 -0.25 12.5
  [4,4,11.7,-0.25,13.5,7.12,-0.25,11.73,7.3,-0.25,10.85,11.9,-0.25,12.5],
// 4 4 11.9 -0.25 12.5 7.3 -0.25 10.85 7.3 -0.25 -1.3 11.9 -0.25 -11.85
  [4,4,11.9,-0.25,12.5,7.3,-0.25,10.85,7.3,-0.25,-1.3,11.9,-0.25,-11.85],
// 0 // white border
// 4 15 -12.3 -0.25 12.5 -12.3 -0.25 -11.85 -11.9 -0.25 -11.85 -11.9 -0.25 12.5
  [4,15,-12.3,-0.25,12.5,-12.3,-0.25,-11.85,-11.9,-0.25,-11.85,-11.9,-0.25,12.5],
// 4 15 -12.07 -0.25 13.65 -12.3 -0.25 12.5 -11.9 -0.25 12.5 -11.7 -0.25 13.5
  [4,15,-12.07,-0.25,13.65,-12.3,-0.25,12.5,-11.9,-0.25,12.5,-11.7,-0.25,13.5],
// 4 15 -11.7 -0.25 -12.85 -11.9 -0.25 -11.85 -12.3 -0.25 -11.85 -12.07 -0.25 -13
  [4,15,-11.7,-0.25,-12.85,-11.9,-0.25,-11.85,-12.3,-0.25,-11.85,-12.07,-0.25,-13],
// 4 15 -11.42 -0.25 14.62 -12.07 -0.25 13.65 -11.7 -0.25 13.5 -11.14 -0.25 14.34
  [4,15,-11.42,-0.25,14.62,-12.07,-0.25,13.65,-11.7,-0.25,13.5,-11.14,-0.25,14.34],
// 4 15 -11.14 -0.25 -13.69 -11.7 -0.25 -12.85 -12.07 -0.25 -13 -11.42 -0.25 -13.97
  [4,15,-11.14,-0.25,-13.69,-11.7,-0.25,-12.85,-12.07,-0.25,-13,-11.42,-0.25,-13.97],
// 4 15 -10.45 -0.25 15.27 -11.42 -0.25 14.62 -11.14 -0.25 14.34 -10.3 -0.25 14.9
  [4,15,-10.45,-0.25,15.27,-11.42,-0.25,14.62,-11.14,-0.25,14.34,-10.3,-0.25,14.9],
// 4 15 -10.3 -0.25 -14.25 -11.14 -0.25 -13.69 -11.42 -0.25 -13.97 -10.45 -0.25 -14.62
  [4,15,-10.3,-0.25,-14.25,-11.14,-0.25,-13.69,-11.42,-0.25,-13.97,-10.45,-0.25,-14.62],
// 4 15 -9.3 -0.25 15.5 -10.45 -0.25 15.27 -10.3 -0.25 14.9 -9.3 -0.25 15.1
  [4,15,-9.3,-0.25,15.5,-10.45,-0.25,15.27,-10.3,-0.25,14.9,-9.3,-0.25,15.1],
// 4 15 -9.3 -0.25 -14.45 -10.3 -0.25 -14.25 -10.45 -0.25 -14.62 -9.3 -0.25 -14.85
  [4,15,-9.3,-0.25,-14.45,-10.3,-0.25,-14.25,-10.45,-0.25,-14.62,-9.3,-0.25,-14.85],
// 4 15 -3.5 -0.25 -4.9 -1.8 -0.25 -5.7 1.3 -0.25 -5.7 3.3 -0.25 -4.9
  [4,15,-3.5,-0.25,-4.9,-1.8,-0.25,-5.7,1.3,-0.25,-5.7,3.3,-0.25,-4.9],
// 3 15 -3.5 -0.25 -4.9 -1.8 -0.25 -6.4 -1.8 -0.25 -5.7
  [3,15,-3.5,-0.25,-4.9,-1.8,-0.25,-6.4,-1.8,-0.25,-5.7],
// 4 15 -3.5 -0.25 -8.5 -1.8 -0.25 -7.8 -1.8 -0.25 -7.1 -3.5 -0.25 -4.9
  [4,15,-3.5,-0.25,-8.5,-1.8,-0.25,-7.8,-1.8,-0.25,-7.1,-3.5,-0.25,-4.9],
// 3 15 -3.5 -0.25 -4.9 -1.8 -0.25 -7.1 -1.8 -0.25 -6.4
  [3,15,-3.5,-0.25,-4.9,-1.8,-0.25,-7.1,-1.8,-0.25,-6.4],
// 4 15 -1.8 -0.25 -7.8 -3.5 -0.25 -8.5 3.3 -0.25 -8.5 1.3 -0.25 -7.8
  [4,15,-1.8,-0.25,-7.8,-3.5,-0.25,-8.5,3.3,-0.25,-8.5,1.3,-0.25,-7.8],
// 4 15 1.3 -0.25 -6.4 -1.8 -0.25 -6.4 -1.8 -0.25 -7.1 1.3 -0.25 -7.1
  [4,15,1.3,-0.25,-6.4,-1.8,-0.25,-6.4,-1.8,-0.25,-7.1,1.3,-0.25,-7.1],
// 4 15 1.3 -0.25 -7.1 1.3 -0.25 -7.8 3.3 -0.25 -8.5 3.3 -0.25 -4.9
  [4,15,1.3,-0.25,-7.1,1.3,-0.25,-7.8,3.3,-0.25,-8.5,3.3,-0.25,-4.9],
// 3 15 3.3 -0.25 -4.9 1.3 -0.25 -5.7 1.3 -0.25 -6.4
  [3,15,3.3,-0.25,-4.9,1.3,-0.25,-5.7,1.3,-0.25,-6.4],
// 3 15 3.3 -0.25 -4.9 1.3 -0.25 -6.4 1.3 -0.25 -7.1
  [3,15,3.3,-0.25,-4.9,1.3,-0.25,-6.4,1.3,-0.25,-7.1],
// 4 15 9.3 -0.25 15.5 -9.3 -0.25 15.5 -9.3 -0.25 15.1 9.3 -0.25 15.1
  [4,15,9.3,-0.25,15.5,-9.3,-0.25,15.5,-9.3,-0.25,15.1,9.3,-0.25,15.1],
// 4 15 9.3 -0.25 -14.45 -9.3 -0.25 -14.45 -9.3 -0.25 -14.85 9.3 -0.25 -14.85
  [4,15,9.3,-0.25,-14.45,-9.3,-0.25,-14.45,-9.3,-0.25,-14.85,9.3,-0.25,-14.85],
// 4 15 10.3 -0.25 -14.25 9.3 -0.25 -14.45 9.3 -0.25 -14.85 10.45 -0.25 -14.62
  [4,15,10.3,-0.25,-14.25,9.3,-0.25,-14.45,9.3,-0.25,-14.85,10.45,-0.25,-14.62],
// 4 15 10.4481 -0.25 15.2717 9.3 -0.25 15.5 9.3 -0.25 15.1 10.3 -0.25 14.9
  [4,15,10.4481,-0.25,15.2717,9.3,-0.25,15.5,9.3,-0.25,15.1,10.3,-0.25,14.9],
// 4 15 11.14 -0.25 -13.69 10.3 -0.25 -14.25 10.45 -0.25 -14.62 11.42 -0.25 -13.97
  [4,15,11.14,-0.25,-13.69,10.3,-0.25,-14.25,10.45,-0.25,-14.62,11.42,-0.25,-13.97],
// 4 15 11.4213 -0.25 14.6213 10.4481 -0.25 15.2717 10.3 -0.25 14.9 11.14 -0.25 14.34
  [4,15,11.4213,-0.25,14.6213,10.4481,-0.25,15.2717,10.3,-0.25,14.9,11.14,-0.25,14.34],
// 4 15 11.7 -0.25 -12.85 11.14 -0.25 -13.69 11.42 -0.25 -13.97 12.07 -0.25 -13
  [4,15,11.7,-0.25,-12.85,11.14,-0.25,-13.69,11.42,-0.25,-13.97,12.07,-0.25,-13],
// 4 15 11.9 -0.25 -11.85 11.7 -0.25 -12.85 12.07 -0.25 -13 12.3 -0.25 -11.85
  [4,15,11.9,-0.25,-11.85,11.7,-0.25,-12.85,12.07,-0.25,-13,12.3,-0.25,-11.85],
// 4 15 12.0717 -0.25 13.6481 11.4213 -0.25 14.6213 11.14 -0.25 14.34 11.7 -0.25 13.5
  [4,15,12.0717,-0.25,13.6481,11.4213,-0.25,14.6213,11.14,-0.25,14.34,11.7,-0.25,13.5],
// 4 15 12.3 -0.25 12.5 12.0717 -0.25 13.6481 11.7 -0.25 13.5 11.9 -0.25 12.5
  [4,15,12.3,-0.25,12.5,12.0717,-0.25,13.6481,11.7,-0.25,13.5,11.9,-0.25,12.5],
// 4 15 12.3 -0.25 12.5 11.9 -0.25 12.5 11.9 -0.25 -11.85 12.3 -0.25 -11.85
  [4,15,12.3,-0.25,12.5,11.9,-0.25,12.5,11.9,-0.25,-11.85,12.3,-0.25,-11.85],
// 0 // neutral lateral faces
// 1 16 -13 -0.25 -16 -2 0 0 0 0.25 0 0 0 -2 1-4cyli.dat
  [1,16,-13,-0.25,-16,-2,0,0,0,0.25,0,0,0,-2, ldraw_lib__1_4cyli()],
// 1 16 -13 -0.25 16 -2 0 0 0 0.25 0 0 0 2 1-4cyli.dat
  [1,16,-13,-0.25,16,-2,0,0,0,0.25,0,0,0,2, ldraw_lib__1_4cyli()],
// 1 16 13 -0.25 -16 2 0 0 0 0.25 0 0 0 -2 1-4cyli.dat
  [1,16,13,-0.25,-16,2,0,0,0,0.25,0,0,0,-2, ldraw_lib__1_4cyli()],
// 1 16 13 -0.25 16 2 0 0 0 0.25 0 0 0 2 1-4cyli.dat
  [1,16,13,-0.25,16,2,0,0,0,0.25,0,0,0,2, ldraw_lib__1_4cyli()],
// 4 16 -15 0 -16 -15 -0.25 -16 -15 -0.25 16 -15 0 16
  [4,16,-15,0,-16,-15,-0.25,-16,-15,-0.25,16,-15,0,16],
// 4 16 -13 0 18 -13 -0.25 18 13 -0.25 18 13 0 18
  [4,16,-13,0,18,-13,-0.25,18,13,-0.25,18,13,0,18],
// 4 16 13 0 -18 13 -0.25 -18 -13 -0.25 -18 -13 0 -18
  [4,16,13,0,-18,13,-0.25,-18,-13,-0.25,-18,-13,0,-18],
// 4 16 15 0 16 15 -0.25 16 15 -0.25 -16 15 0 -16
  [4,16,15,0,16,15,-0.25,16,15,-0.25,-16,15,0,-16],
// 0 // neutral bottom face
// 1 16 -13 0 -16 -2 0 0 0 -1 0 0 0 -2 1-4chrd.dat
  [1,16,-13,0,-16,-2,0,0,0,-1,0,0,0,-2, ldraw_lib__1_4chrd()],
// 1 16 -13 0 16 -2 0 0 0 -1 0 0 0 2 1-4chrd.dat
  [1,16,-13,0,16,-2,0,0,0,-1,0,0,0,2, ldraw_lib__1_4chrd()],
// 1 16 13 0 -16 2 0 0 0 -1 0 0 0 -2 1-4chrd.dat
  [1,16,13,0,-16,2,0,0,0,-1,0,0,0,-2, ldraw_lib__1_4chrd()],
// 1 16 13 0 16 2 0 0 0 -1 0 0 0 2 1-4chrd.dat
  [1,16,13,0,16,2,0,0,0,-1,0,0,0,2, ldraw_lib__1_4chrd()],
// 4 16 -15 0 16 -13 0 18 13 0 18 15 0 16
  [4,16,-15,0,16,-13,0,18,13,0,18,15,0,16],
// 4 16 -15 0 16 15 0 16 15 0 -16 -15 0 -16
  [4,16,-15,0,16,15,0,16,15,0,-16,-15,0,-16],
// 4 16 15 0 -16 13 0 -18 -13 0 -18 -15 0 -16
  [4,16,15,0,-16,13,0,-18,-13,0,-18,-15,0,-16],
];
makepoly(ldraw_lib__6138629f(), line=0.2);
